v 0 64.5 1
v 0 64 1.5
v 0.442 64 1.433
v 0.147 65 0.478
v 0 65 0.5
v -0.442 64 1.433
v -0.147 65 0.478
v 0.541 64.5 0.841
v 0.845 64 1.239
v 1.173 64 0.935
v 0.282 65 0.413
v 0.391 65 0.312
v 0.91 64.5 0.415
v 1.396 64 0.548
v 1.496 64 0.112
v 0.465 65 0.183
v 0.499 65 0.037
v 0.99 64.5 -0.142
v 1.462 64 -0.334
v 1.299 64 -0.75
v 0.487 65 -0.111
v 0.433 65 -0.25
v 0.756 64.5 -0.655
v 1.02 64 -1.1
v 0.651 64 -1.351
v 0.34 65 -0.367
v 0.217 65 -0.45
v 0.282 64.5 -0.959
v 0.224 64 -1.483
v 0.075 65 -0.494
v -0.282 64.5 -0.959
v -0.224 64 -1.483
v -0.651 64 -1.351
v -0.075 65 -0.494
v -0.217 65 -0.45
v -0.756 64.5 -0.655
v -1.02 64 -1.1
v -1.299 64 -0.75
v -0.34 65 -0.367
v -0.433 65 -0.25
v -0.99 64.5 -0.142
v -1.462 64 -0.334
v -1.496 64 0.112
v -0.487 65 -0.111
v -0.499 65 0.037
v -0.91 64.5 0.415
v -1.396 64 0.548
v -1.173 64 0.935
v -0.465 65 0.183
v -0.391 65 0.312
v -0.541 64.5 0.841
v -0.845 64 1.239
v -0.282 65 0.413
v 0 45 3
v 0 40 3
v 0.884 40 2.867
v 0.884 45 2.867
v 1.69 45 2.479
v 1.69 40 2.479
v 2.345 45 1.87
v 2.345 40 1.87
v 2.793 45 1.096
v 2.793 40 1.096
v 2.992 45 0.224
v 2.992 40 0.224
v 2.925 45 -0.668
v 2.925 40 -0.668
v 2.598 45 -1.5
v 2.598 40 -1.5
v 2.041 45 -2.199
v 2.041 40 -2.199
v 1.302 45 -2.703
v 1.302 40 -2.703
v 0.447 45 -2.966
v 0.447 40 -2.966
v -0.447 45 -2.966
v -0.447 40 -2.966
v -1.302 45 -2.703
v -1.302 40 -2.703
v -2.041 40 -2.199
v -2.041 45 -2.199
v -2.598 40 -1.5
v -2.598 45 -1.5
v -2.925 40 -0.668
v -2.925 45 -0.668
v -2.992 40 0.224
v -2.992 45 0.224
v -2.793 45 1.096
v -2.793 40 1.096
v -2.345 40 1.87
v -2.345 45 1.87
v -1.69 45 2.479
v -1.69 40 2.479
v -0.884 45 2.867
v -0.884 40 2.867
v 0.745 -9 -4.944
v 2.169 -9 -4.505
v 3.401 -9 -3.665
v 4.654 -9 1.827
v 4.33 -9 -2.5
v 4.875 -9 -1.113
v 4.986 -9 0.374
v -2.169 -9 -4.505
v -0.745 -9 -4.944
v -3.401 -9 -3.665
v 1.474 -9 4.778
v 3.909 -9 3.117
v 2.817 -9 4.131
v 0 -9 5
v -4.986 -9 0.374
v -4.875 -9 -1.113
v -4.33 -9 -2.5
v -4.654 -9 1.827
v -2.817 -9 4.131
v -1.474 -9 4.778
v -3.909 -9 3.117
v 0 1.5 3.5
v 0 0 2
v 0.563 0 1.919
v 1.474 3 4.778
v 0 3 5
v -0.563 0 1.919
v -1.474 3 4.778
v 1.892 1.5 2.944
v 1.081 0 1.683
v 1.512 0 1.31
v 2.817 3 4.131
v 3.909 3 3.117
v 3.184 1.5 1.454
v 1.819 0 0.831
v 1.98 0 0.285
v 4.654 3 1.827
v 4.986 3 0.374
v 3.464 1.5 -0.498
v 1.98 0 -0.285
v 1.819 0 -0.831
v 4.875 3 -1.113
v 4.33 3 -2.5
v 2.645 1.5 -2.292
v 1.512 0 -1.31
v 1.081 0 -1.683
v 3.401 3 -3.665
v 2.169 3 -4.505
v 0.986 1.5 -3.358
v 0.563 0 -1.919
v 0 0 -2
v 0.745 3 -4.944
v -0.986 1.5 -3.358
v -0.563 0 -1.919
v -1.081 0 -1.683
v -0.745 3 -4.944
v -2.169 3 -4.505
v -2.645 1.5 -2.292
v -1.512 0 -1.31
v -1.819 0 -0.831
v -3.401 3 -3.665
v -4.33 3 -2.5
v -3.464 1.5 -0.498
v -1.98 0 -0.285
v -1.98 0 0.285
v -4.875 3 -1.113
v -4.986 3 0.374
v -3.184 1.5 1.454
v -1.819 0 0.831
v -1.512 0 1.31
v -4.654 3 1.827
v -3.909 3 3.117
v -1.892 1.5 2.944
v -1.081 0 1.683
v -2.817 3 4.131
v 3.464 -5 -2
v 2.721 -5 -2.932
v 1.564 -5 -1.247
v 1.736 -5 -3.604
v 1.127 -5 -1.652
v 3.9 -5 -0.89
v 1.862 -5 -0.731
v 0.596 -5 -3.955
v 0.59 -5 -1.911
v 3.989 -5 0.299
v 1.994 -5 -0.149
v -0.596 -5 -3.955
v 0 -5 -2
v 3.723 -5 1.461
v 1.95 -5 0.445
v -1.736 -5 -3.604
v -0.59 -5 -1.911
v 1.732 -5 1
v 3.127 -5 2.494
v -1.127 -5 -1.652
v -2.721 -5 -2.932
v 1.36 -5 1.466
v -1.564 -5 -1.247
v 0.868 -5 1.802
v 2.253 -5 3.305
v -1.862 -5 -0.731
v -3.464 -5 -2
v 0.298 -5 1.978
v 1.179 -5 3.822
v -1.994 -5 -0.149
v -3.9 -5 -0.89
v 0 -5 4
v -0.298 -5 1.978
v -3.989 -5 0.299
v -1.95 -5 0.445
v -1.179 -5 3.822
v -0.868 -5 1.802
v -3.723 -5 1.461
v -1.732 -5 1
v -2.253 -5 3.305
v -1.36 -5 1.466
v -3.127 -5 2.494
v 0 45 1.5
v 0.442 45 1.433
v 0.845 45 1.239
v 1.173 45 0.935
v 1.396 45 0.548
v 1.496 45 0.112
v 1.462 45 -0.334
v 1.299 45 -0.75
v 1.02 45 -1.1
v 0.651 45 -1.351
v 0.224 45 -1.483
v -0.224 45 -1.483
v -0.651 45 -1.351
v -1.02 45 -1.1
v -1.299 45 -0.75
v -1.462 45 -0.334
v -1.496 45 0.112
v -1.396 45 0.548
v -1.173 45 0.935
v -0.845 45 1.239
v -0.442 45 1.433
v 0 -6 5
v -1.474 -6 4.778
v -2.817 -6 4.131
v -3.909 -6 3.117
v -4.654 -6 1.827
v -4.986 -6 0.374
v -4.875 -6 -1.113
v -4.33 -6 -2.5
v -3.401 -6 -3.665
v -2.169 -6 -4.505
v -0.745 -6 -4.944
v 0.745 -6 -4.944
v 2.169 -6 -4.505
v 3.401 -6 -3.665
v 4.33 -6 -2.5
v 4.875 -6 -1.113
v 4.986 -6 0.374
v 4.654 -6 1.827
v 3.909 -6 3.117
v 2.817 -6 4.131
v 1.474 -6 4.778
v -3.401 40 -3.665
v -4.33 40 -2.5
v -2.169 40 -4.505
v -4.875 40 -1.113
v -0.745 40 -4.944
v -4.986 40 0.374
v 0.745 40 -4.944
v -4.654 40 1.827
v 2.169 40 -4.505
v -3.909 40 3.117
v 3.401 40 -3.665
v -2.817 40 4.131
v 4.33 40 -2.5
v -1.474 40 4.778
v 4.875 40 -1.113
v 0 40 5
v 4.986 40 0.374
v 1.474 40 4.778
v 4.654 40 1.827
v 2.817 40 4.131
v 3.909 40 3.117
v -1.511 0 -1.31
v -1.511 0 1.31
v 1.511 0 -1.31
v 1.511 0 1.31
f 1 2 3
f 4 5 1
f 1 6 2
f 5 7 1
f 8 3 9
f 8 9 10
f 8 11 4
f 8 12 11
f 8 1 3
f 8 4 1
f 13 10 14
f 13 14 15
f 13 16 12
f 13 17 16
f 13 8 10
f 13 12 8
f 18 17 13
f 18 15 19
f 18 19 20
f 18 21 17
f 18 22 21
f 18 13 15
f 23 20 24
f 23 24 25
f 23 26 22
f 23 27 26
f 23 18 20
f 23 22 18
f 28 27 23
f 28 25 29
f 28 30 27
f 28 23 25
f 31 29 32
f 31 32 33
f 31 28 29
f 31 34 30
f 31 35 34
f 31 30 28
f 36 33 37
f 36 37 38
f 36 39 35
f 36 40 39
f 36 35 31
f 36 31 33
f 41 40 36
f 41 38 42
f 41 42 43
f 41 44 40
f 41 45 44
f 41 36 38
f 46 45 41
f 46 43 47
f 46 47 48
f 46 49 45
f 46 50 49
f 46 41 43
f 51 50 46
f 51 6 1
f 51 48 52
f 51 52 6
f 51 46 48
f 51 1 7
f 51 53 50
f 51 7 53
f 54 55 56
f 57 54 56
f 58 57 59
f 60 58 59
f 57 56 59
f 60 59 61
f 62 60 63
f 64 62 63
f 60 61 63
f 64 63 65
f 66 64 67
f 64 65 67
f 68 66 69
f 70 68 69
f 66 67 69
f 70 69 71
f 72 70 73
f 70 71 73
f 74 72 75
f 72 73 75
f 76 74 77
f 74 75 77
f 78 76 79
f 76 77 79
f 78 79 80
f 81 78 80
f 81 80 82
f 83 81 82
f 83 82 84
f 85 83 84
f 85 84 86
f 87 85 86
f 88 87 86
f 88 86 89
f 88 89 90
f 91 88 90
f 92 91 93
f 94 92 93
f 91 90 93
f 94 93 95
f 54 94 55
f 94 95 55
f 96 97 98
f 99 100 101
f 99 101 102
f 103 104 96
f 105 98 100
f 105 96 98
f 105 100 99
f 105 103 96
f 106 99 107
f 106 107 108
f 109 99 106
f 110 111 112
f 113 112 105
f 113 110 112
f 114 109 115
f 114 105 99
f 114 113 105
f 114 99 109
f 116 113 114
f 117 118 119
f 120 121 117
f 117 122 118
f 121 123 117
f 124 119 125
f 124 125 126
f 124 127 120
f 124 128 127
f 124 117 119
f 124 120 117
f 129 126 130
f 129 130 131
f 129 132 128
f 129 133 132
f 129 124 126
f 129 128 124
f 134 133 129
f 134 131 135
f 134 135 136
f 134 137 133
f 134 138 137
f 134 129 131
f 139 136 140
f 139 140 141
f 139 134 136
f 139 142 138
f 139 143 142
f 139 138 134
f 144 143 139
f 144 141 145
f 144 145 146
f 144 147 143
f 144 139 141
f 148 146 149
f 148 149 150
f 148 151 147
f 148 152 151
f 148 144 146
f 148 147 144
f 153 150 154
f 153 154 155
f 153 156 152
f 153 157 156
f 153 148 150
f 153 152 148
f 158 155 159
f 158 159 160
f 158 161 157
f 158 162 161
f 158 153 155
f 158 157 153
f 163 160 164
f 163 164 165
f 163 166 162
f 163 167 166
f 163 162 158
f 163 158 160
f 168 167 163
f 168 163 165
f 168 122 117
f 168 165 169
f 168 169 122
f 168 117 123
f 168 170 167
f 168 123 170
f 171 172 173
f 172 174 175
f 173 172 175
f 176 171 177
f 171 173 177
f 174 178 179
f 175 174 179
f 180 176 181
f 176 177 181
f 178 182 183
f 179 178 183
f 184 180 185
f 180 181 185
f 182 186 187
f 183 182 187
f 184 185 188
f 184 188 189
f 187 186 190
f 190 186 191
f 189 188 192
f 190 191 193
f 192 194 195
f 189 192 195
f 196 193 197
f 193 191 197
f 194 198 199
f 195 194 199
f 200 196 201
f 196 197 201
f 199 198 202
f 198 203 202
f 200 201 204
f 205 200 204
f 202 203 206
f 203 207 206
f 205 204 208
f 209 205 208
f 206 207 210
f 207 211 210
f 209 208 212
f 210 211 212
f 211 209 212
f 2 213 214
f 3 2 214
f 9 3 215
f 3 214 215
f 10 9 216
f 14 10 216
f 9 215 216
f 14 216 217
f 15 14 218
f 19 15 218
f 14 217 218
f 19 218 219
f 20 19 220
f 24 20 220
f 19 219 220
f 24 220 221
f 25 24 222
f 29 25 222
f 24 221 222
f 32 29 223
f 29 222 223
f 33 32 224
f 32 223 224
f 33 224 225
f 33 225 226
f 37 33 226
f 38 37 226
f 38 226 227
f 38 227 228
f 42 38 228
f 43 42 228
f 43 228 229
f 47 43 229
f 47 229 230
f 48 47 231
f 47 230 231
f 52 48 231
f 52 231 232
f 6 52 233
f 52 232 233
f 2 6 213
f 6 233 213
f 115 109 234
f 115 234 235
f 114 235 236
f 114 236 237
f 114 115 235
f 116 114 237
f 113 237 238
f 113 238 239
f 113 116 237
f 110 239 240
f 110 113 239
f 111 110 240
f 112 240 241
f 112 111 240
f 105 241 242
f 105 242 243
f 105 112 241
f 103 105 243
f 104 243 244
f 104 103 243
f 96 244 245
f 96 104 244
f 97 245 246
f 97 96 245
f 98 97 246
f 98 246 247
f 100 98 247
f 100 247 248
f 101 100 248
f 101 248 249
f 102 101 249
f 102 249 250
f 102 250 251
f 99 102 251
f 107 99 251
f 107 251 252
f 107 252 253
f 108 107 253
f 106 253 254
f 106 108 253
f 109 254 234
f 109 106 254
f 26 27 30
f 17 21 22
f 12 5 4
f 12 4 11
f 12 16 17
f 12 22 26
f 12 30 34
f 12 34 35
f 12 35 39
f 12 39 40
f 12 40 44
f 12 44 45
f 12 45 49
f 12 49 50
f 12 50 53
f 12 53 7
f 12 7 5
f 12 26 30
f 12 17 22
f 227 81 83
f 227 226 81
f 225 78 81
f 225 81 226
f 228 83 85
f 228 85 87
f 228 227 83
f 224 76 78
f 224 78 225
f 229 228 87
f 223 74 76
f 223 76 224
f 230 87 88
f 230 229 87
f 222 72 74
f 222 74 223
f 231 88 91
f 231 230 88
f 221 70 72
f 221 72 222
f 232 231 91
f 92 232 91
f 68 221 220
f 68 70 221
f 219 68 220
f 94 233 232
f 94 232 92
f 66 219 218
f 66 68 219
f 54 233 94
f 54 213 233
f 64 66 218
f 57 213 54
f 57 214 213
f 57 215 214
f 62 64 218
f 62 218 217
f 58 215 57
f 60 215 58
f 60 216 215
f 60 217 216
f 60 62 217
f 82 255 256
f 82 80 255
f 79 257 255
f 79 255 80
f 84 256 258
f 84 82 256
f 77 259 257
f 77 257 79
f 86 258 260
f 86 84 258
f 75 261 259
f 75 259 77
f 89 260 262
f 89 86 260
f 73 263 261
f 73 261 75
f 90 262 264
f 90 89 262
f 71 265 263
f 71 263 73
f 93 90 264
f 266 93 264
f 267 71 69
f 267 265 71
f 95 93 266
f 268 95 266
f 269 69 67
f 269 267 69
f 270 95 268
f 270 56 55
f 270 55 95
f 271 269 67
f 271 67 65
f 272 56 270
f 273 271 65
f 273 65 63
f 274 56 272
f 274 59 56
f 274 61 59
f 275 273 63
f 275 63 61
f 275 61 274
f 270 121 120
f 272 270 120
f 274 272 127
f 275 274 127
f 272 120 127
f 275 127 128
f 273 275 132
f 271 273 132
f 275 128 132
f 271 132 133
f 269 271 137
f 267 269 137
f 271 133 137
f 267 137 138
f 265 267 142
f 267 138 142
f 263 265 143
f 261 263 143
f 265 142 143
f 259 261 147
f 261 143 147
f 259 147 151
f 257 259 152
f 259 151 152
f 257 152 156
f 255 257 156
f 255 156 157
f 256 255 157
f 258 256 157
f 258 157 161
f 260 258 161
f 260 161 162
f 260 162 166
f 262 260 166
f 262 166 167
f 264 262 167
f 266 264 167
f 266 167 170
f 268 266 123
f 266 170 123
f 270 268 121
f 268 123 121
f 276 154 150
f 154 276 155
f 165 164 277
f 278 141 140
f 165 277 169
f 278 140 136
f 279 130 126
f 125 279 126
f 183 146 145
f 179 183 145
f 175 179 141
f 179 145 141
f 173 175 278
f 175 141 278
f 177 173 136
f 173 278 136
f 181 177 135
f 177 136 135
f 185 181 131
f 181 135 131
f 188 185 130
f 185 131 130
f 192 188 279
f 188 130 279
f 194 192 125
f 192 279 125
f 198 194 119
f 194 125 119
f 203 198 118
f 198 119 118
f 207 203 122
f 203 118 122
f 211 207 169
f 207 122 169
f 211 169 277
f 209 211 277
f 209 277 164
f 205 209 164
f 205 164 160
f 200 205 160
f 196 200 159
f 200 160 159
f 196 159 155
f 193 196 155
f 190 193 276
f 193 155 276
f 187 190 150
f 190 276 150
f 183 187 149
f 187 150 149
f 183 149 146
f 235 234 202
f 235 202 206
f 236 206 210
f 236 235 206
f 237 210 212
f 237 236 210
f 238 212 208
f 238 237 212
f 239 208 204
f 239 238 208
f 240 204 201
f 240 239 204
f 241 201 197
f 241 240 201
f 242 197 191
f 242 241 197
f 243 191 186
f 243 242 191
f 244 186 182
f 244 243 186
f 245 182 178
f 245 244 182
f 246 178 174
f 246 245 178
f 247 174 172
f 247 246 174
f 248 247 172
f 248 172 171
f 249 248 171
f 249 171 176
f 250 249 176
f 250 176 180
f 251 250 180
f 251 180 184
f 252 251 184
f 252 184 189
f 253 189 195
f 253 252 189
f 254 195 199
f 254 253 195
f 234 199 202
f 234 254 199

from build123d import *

# Parameters (mm, degrees)
SKETCH1_R           = 5
BOSS_EXTRUDE1_DEPTH = 40
SKETCH2_R           = 3
BOSS_EXTRUDE2_DEPTH = 5
SKETCH3_R           = 1.5
BOSS_EXTRUDE3_DEPTH = 20
CHAMFER1_SIZE       = 1
SKETCH4_R           = 2
BOSS_EXTRUDE4_DEPTH = 5
BOSS_EXTRUDE5_START = 4
SKETCH5_R           = 5
BOSS_EXTRUDE5_DEPTH = 4
CHAMFER2_SIZE       = 3
CHAMFER3_SIZE       = 1


with BuildPart() as part:
    # Sketch1 → Boss-Extrude1 (new body)
    with BuildSketch(Plane(origin=(0, 0, 0), x_dir=(1, 0, 0), z_dir=(0, 1, 0))):
        with Locations(Location((0, 0, 0), (0, 0, 270))):
            Circle(SKETCH1_R)
    extrude(amount=BOSS_EXTRUDE1_DEPTH)

    # Sketch2 → Boss-Extrude2 (add)
    with BuildSketch(Plane(origin=(0, 40, 0), x_dir=(1, 0, 0), z_dir=(0, 1, 0))):
        with Locations(Location((0, 0, 0), (0, 0, 270))):
            Circle(SKETCH2_R)
    extrude(amount=BOSS_EXTRUDE2_DEPTH)

    # Sketch3 → Boss-Extrude3 (add)
    with BuildSketch(Plane(origin=(0, 45, 0), x_dir=(1, 0, 0), z_dir=(0, 1, 0))):
        with Locations(Location((0, 0, 0), (0, 0, 270))):
            Circle(SKETCH3_R)
    extrude(amount=BOSS_EXTRUDE3_DEPTH)

    # Chamfer1
    chamfer1_edges = [part.edges().sort_by_distance(p)[0] for p in [
        (0, 65, -1.5),
    ]]
    chamfer(chamfer1_edges, length=CHAMFER1_SIZE)

    # Sketch4 → Boss-Extrude4 (add)
    with BuildSketch(Plane.XZ):
        with Locations(Location((0, 0, 0), (0, 0, 270))):
            Circle(SKETCH4_R)
    extrude(amount=BOSS_EXTRUDE4_DEPTH)

    # Sketch5 → Boss-Extrude5 (add)
    with BuildSketch(Plane.XZ.offset(5).offset(BOSS_EXTRUDE5_START)):
        with Locations(Location((0, 0, 0), (0, 0, 90))):
            Circle(SKETCH5_R)
    extrude(amount=-BOSS_EXTRUDE5_DEPTH)

    # Chamfer2
    chamfer2_edges = [part.edges().sort_by_distance(p)[0] for p in [
        (0, 0, -5),
    ]]
    chamfer(chamfer2_edges, length=CHAMFER2_SIZE - 0.0001)  # a hair under: the kernel refuses the full size

    # Chamfer3
    chamfer3_edges = [part.edges().sort_by_distance(p)[0] for p in [
        (0, -5, -5),
    ]]
    chamfer(chamfer3_edges, length=CHAMFER3_SIZE)


solid = part.part
